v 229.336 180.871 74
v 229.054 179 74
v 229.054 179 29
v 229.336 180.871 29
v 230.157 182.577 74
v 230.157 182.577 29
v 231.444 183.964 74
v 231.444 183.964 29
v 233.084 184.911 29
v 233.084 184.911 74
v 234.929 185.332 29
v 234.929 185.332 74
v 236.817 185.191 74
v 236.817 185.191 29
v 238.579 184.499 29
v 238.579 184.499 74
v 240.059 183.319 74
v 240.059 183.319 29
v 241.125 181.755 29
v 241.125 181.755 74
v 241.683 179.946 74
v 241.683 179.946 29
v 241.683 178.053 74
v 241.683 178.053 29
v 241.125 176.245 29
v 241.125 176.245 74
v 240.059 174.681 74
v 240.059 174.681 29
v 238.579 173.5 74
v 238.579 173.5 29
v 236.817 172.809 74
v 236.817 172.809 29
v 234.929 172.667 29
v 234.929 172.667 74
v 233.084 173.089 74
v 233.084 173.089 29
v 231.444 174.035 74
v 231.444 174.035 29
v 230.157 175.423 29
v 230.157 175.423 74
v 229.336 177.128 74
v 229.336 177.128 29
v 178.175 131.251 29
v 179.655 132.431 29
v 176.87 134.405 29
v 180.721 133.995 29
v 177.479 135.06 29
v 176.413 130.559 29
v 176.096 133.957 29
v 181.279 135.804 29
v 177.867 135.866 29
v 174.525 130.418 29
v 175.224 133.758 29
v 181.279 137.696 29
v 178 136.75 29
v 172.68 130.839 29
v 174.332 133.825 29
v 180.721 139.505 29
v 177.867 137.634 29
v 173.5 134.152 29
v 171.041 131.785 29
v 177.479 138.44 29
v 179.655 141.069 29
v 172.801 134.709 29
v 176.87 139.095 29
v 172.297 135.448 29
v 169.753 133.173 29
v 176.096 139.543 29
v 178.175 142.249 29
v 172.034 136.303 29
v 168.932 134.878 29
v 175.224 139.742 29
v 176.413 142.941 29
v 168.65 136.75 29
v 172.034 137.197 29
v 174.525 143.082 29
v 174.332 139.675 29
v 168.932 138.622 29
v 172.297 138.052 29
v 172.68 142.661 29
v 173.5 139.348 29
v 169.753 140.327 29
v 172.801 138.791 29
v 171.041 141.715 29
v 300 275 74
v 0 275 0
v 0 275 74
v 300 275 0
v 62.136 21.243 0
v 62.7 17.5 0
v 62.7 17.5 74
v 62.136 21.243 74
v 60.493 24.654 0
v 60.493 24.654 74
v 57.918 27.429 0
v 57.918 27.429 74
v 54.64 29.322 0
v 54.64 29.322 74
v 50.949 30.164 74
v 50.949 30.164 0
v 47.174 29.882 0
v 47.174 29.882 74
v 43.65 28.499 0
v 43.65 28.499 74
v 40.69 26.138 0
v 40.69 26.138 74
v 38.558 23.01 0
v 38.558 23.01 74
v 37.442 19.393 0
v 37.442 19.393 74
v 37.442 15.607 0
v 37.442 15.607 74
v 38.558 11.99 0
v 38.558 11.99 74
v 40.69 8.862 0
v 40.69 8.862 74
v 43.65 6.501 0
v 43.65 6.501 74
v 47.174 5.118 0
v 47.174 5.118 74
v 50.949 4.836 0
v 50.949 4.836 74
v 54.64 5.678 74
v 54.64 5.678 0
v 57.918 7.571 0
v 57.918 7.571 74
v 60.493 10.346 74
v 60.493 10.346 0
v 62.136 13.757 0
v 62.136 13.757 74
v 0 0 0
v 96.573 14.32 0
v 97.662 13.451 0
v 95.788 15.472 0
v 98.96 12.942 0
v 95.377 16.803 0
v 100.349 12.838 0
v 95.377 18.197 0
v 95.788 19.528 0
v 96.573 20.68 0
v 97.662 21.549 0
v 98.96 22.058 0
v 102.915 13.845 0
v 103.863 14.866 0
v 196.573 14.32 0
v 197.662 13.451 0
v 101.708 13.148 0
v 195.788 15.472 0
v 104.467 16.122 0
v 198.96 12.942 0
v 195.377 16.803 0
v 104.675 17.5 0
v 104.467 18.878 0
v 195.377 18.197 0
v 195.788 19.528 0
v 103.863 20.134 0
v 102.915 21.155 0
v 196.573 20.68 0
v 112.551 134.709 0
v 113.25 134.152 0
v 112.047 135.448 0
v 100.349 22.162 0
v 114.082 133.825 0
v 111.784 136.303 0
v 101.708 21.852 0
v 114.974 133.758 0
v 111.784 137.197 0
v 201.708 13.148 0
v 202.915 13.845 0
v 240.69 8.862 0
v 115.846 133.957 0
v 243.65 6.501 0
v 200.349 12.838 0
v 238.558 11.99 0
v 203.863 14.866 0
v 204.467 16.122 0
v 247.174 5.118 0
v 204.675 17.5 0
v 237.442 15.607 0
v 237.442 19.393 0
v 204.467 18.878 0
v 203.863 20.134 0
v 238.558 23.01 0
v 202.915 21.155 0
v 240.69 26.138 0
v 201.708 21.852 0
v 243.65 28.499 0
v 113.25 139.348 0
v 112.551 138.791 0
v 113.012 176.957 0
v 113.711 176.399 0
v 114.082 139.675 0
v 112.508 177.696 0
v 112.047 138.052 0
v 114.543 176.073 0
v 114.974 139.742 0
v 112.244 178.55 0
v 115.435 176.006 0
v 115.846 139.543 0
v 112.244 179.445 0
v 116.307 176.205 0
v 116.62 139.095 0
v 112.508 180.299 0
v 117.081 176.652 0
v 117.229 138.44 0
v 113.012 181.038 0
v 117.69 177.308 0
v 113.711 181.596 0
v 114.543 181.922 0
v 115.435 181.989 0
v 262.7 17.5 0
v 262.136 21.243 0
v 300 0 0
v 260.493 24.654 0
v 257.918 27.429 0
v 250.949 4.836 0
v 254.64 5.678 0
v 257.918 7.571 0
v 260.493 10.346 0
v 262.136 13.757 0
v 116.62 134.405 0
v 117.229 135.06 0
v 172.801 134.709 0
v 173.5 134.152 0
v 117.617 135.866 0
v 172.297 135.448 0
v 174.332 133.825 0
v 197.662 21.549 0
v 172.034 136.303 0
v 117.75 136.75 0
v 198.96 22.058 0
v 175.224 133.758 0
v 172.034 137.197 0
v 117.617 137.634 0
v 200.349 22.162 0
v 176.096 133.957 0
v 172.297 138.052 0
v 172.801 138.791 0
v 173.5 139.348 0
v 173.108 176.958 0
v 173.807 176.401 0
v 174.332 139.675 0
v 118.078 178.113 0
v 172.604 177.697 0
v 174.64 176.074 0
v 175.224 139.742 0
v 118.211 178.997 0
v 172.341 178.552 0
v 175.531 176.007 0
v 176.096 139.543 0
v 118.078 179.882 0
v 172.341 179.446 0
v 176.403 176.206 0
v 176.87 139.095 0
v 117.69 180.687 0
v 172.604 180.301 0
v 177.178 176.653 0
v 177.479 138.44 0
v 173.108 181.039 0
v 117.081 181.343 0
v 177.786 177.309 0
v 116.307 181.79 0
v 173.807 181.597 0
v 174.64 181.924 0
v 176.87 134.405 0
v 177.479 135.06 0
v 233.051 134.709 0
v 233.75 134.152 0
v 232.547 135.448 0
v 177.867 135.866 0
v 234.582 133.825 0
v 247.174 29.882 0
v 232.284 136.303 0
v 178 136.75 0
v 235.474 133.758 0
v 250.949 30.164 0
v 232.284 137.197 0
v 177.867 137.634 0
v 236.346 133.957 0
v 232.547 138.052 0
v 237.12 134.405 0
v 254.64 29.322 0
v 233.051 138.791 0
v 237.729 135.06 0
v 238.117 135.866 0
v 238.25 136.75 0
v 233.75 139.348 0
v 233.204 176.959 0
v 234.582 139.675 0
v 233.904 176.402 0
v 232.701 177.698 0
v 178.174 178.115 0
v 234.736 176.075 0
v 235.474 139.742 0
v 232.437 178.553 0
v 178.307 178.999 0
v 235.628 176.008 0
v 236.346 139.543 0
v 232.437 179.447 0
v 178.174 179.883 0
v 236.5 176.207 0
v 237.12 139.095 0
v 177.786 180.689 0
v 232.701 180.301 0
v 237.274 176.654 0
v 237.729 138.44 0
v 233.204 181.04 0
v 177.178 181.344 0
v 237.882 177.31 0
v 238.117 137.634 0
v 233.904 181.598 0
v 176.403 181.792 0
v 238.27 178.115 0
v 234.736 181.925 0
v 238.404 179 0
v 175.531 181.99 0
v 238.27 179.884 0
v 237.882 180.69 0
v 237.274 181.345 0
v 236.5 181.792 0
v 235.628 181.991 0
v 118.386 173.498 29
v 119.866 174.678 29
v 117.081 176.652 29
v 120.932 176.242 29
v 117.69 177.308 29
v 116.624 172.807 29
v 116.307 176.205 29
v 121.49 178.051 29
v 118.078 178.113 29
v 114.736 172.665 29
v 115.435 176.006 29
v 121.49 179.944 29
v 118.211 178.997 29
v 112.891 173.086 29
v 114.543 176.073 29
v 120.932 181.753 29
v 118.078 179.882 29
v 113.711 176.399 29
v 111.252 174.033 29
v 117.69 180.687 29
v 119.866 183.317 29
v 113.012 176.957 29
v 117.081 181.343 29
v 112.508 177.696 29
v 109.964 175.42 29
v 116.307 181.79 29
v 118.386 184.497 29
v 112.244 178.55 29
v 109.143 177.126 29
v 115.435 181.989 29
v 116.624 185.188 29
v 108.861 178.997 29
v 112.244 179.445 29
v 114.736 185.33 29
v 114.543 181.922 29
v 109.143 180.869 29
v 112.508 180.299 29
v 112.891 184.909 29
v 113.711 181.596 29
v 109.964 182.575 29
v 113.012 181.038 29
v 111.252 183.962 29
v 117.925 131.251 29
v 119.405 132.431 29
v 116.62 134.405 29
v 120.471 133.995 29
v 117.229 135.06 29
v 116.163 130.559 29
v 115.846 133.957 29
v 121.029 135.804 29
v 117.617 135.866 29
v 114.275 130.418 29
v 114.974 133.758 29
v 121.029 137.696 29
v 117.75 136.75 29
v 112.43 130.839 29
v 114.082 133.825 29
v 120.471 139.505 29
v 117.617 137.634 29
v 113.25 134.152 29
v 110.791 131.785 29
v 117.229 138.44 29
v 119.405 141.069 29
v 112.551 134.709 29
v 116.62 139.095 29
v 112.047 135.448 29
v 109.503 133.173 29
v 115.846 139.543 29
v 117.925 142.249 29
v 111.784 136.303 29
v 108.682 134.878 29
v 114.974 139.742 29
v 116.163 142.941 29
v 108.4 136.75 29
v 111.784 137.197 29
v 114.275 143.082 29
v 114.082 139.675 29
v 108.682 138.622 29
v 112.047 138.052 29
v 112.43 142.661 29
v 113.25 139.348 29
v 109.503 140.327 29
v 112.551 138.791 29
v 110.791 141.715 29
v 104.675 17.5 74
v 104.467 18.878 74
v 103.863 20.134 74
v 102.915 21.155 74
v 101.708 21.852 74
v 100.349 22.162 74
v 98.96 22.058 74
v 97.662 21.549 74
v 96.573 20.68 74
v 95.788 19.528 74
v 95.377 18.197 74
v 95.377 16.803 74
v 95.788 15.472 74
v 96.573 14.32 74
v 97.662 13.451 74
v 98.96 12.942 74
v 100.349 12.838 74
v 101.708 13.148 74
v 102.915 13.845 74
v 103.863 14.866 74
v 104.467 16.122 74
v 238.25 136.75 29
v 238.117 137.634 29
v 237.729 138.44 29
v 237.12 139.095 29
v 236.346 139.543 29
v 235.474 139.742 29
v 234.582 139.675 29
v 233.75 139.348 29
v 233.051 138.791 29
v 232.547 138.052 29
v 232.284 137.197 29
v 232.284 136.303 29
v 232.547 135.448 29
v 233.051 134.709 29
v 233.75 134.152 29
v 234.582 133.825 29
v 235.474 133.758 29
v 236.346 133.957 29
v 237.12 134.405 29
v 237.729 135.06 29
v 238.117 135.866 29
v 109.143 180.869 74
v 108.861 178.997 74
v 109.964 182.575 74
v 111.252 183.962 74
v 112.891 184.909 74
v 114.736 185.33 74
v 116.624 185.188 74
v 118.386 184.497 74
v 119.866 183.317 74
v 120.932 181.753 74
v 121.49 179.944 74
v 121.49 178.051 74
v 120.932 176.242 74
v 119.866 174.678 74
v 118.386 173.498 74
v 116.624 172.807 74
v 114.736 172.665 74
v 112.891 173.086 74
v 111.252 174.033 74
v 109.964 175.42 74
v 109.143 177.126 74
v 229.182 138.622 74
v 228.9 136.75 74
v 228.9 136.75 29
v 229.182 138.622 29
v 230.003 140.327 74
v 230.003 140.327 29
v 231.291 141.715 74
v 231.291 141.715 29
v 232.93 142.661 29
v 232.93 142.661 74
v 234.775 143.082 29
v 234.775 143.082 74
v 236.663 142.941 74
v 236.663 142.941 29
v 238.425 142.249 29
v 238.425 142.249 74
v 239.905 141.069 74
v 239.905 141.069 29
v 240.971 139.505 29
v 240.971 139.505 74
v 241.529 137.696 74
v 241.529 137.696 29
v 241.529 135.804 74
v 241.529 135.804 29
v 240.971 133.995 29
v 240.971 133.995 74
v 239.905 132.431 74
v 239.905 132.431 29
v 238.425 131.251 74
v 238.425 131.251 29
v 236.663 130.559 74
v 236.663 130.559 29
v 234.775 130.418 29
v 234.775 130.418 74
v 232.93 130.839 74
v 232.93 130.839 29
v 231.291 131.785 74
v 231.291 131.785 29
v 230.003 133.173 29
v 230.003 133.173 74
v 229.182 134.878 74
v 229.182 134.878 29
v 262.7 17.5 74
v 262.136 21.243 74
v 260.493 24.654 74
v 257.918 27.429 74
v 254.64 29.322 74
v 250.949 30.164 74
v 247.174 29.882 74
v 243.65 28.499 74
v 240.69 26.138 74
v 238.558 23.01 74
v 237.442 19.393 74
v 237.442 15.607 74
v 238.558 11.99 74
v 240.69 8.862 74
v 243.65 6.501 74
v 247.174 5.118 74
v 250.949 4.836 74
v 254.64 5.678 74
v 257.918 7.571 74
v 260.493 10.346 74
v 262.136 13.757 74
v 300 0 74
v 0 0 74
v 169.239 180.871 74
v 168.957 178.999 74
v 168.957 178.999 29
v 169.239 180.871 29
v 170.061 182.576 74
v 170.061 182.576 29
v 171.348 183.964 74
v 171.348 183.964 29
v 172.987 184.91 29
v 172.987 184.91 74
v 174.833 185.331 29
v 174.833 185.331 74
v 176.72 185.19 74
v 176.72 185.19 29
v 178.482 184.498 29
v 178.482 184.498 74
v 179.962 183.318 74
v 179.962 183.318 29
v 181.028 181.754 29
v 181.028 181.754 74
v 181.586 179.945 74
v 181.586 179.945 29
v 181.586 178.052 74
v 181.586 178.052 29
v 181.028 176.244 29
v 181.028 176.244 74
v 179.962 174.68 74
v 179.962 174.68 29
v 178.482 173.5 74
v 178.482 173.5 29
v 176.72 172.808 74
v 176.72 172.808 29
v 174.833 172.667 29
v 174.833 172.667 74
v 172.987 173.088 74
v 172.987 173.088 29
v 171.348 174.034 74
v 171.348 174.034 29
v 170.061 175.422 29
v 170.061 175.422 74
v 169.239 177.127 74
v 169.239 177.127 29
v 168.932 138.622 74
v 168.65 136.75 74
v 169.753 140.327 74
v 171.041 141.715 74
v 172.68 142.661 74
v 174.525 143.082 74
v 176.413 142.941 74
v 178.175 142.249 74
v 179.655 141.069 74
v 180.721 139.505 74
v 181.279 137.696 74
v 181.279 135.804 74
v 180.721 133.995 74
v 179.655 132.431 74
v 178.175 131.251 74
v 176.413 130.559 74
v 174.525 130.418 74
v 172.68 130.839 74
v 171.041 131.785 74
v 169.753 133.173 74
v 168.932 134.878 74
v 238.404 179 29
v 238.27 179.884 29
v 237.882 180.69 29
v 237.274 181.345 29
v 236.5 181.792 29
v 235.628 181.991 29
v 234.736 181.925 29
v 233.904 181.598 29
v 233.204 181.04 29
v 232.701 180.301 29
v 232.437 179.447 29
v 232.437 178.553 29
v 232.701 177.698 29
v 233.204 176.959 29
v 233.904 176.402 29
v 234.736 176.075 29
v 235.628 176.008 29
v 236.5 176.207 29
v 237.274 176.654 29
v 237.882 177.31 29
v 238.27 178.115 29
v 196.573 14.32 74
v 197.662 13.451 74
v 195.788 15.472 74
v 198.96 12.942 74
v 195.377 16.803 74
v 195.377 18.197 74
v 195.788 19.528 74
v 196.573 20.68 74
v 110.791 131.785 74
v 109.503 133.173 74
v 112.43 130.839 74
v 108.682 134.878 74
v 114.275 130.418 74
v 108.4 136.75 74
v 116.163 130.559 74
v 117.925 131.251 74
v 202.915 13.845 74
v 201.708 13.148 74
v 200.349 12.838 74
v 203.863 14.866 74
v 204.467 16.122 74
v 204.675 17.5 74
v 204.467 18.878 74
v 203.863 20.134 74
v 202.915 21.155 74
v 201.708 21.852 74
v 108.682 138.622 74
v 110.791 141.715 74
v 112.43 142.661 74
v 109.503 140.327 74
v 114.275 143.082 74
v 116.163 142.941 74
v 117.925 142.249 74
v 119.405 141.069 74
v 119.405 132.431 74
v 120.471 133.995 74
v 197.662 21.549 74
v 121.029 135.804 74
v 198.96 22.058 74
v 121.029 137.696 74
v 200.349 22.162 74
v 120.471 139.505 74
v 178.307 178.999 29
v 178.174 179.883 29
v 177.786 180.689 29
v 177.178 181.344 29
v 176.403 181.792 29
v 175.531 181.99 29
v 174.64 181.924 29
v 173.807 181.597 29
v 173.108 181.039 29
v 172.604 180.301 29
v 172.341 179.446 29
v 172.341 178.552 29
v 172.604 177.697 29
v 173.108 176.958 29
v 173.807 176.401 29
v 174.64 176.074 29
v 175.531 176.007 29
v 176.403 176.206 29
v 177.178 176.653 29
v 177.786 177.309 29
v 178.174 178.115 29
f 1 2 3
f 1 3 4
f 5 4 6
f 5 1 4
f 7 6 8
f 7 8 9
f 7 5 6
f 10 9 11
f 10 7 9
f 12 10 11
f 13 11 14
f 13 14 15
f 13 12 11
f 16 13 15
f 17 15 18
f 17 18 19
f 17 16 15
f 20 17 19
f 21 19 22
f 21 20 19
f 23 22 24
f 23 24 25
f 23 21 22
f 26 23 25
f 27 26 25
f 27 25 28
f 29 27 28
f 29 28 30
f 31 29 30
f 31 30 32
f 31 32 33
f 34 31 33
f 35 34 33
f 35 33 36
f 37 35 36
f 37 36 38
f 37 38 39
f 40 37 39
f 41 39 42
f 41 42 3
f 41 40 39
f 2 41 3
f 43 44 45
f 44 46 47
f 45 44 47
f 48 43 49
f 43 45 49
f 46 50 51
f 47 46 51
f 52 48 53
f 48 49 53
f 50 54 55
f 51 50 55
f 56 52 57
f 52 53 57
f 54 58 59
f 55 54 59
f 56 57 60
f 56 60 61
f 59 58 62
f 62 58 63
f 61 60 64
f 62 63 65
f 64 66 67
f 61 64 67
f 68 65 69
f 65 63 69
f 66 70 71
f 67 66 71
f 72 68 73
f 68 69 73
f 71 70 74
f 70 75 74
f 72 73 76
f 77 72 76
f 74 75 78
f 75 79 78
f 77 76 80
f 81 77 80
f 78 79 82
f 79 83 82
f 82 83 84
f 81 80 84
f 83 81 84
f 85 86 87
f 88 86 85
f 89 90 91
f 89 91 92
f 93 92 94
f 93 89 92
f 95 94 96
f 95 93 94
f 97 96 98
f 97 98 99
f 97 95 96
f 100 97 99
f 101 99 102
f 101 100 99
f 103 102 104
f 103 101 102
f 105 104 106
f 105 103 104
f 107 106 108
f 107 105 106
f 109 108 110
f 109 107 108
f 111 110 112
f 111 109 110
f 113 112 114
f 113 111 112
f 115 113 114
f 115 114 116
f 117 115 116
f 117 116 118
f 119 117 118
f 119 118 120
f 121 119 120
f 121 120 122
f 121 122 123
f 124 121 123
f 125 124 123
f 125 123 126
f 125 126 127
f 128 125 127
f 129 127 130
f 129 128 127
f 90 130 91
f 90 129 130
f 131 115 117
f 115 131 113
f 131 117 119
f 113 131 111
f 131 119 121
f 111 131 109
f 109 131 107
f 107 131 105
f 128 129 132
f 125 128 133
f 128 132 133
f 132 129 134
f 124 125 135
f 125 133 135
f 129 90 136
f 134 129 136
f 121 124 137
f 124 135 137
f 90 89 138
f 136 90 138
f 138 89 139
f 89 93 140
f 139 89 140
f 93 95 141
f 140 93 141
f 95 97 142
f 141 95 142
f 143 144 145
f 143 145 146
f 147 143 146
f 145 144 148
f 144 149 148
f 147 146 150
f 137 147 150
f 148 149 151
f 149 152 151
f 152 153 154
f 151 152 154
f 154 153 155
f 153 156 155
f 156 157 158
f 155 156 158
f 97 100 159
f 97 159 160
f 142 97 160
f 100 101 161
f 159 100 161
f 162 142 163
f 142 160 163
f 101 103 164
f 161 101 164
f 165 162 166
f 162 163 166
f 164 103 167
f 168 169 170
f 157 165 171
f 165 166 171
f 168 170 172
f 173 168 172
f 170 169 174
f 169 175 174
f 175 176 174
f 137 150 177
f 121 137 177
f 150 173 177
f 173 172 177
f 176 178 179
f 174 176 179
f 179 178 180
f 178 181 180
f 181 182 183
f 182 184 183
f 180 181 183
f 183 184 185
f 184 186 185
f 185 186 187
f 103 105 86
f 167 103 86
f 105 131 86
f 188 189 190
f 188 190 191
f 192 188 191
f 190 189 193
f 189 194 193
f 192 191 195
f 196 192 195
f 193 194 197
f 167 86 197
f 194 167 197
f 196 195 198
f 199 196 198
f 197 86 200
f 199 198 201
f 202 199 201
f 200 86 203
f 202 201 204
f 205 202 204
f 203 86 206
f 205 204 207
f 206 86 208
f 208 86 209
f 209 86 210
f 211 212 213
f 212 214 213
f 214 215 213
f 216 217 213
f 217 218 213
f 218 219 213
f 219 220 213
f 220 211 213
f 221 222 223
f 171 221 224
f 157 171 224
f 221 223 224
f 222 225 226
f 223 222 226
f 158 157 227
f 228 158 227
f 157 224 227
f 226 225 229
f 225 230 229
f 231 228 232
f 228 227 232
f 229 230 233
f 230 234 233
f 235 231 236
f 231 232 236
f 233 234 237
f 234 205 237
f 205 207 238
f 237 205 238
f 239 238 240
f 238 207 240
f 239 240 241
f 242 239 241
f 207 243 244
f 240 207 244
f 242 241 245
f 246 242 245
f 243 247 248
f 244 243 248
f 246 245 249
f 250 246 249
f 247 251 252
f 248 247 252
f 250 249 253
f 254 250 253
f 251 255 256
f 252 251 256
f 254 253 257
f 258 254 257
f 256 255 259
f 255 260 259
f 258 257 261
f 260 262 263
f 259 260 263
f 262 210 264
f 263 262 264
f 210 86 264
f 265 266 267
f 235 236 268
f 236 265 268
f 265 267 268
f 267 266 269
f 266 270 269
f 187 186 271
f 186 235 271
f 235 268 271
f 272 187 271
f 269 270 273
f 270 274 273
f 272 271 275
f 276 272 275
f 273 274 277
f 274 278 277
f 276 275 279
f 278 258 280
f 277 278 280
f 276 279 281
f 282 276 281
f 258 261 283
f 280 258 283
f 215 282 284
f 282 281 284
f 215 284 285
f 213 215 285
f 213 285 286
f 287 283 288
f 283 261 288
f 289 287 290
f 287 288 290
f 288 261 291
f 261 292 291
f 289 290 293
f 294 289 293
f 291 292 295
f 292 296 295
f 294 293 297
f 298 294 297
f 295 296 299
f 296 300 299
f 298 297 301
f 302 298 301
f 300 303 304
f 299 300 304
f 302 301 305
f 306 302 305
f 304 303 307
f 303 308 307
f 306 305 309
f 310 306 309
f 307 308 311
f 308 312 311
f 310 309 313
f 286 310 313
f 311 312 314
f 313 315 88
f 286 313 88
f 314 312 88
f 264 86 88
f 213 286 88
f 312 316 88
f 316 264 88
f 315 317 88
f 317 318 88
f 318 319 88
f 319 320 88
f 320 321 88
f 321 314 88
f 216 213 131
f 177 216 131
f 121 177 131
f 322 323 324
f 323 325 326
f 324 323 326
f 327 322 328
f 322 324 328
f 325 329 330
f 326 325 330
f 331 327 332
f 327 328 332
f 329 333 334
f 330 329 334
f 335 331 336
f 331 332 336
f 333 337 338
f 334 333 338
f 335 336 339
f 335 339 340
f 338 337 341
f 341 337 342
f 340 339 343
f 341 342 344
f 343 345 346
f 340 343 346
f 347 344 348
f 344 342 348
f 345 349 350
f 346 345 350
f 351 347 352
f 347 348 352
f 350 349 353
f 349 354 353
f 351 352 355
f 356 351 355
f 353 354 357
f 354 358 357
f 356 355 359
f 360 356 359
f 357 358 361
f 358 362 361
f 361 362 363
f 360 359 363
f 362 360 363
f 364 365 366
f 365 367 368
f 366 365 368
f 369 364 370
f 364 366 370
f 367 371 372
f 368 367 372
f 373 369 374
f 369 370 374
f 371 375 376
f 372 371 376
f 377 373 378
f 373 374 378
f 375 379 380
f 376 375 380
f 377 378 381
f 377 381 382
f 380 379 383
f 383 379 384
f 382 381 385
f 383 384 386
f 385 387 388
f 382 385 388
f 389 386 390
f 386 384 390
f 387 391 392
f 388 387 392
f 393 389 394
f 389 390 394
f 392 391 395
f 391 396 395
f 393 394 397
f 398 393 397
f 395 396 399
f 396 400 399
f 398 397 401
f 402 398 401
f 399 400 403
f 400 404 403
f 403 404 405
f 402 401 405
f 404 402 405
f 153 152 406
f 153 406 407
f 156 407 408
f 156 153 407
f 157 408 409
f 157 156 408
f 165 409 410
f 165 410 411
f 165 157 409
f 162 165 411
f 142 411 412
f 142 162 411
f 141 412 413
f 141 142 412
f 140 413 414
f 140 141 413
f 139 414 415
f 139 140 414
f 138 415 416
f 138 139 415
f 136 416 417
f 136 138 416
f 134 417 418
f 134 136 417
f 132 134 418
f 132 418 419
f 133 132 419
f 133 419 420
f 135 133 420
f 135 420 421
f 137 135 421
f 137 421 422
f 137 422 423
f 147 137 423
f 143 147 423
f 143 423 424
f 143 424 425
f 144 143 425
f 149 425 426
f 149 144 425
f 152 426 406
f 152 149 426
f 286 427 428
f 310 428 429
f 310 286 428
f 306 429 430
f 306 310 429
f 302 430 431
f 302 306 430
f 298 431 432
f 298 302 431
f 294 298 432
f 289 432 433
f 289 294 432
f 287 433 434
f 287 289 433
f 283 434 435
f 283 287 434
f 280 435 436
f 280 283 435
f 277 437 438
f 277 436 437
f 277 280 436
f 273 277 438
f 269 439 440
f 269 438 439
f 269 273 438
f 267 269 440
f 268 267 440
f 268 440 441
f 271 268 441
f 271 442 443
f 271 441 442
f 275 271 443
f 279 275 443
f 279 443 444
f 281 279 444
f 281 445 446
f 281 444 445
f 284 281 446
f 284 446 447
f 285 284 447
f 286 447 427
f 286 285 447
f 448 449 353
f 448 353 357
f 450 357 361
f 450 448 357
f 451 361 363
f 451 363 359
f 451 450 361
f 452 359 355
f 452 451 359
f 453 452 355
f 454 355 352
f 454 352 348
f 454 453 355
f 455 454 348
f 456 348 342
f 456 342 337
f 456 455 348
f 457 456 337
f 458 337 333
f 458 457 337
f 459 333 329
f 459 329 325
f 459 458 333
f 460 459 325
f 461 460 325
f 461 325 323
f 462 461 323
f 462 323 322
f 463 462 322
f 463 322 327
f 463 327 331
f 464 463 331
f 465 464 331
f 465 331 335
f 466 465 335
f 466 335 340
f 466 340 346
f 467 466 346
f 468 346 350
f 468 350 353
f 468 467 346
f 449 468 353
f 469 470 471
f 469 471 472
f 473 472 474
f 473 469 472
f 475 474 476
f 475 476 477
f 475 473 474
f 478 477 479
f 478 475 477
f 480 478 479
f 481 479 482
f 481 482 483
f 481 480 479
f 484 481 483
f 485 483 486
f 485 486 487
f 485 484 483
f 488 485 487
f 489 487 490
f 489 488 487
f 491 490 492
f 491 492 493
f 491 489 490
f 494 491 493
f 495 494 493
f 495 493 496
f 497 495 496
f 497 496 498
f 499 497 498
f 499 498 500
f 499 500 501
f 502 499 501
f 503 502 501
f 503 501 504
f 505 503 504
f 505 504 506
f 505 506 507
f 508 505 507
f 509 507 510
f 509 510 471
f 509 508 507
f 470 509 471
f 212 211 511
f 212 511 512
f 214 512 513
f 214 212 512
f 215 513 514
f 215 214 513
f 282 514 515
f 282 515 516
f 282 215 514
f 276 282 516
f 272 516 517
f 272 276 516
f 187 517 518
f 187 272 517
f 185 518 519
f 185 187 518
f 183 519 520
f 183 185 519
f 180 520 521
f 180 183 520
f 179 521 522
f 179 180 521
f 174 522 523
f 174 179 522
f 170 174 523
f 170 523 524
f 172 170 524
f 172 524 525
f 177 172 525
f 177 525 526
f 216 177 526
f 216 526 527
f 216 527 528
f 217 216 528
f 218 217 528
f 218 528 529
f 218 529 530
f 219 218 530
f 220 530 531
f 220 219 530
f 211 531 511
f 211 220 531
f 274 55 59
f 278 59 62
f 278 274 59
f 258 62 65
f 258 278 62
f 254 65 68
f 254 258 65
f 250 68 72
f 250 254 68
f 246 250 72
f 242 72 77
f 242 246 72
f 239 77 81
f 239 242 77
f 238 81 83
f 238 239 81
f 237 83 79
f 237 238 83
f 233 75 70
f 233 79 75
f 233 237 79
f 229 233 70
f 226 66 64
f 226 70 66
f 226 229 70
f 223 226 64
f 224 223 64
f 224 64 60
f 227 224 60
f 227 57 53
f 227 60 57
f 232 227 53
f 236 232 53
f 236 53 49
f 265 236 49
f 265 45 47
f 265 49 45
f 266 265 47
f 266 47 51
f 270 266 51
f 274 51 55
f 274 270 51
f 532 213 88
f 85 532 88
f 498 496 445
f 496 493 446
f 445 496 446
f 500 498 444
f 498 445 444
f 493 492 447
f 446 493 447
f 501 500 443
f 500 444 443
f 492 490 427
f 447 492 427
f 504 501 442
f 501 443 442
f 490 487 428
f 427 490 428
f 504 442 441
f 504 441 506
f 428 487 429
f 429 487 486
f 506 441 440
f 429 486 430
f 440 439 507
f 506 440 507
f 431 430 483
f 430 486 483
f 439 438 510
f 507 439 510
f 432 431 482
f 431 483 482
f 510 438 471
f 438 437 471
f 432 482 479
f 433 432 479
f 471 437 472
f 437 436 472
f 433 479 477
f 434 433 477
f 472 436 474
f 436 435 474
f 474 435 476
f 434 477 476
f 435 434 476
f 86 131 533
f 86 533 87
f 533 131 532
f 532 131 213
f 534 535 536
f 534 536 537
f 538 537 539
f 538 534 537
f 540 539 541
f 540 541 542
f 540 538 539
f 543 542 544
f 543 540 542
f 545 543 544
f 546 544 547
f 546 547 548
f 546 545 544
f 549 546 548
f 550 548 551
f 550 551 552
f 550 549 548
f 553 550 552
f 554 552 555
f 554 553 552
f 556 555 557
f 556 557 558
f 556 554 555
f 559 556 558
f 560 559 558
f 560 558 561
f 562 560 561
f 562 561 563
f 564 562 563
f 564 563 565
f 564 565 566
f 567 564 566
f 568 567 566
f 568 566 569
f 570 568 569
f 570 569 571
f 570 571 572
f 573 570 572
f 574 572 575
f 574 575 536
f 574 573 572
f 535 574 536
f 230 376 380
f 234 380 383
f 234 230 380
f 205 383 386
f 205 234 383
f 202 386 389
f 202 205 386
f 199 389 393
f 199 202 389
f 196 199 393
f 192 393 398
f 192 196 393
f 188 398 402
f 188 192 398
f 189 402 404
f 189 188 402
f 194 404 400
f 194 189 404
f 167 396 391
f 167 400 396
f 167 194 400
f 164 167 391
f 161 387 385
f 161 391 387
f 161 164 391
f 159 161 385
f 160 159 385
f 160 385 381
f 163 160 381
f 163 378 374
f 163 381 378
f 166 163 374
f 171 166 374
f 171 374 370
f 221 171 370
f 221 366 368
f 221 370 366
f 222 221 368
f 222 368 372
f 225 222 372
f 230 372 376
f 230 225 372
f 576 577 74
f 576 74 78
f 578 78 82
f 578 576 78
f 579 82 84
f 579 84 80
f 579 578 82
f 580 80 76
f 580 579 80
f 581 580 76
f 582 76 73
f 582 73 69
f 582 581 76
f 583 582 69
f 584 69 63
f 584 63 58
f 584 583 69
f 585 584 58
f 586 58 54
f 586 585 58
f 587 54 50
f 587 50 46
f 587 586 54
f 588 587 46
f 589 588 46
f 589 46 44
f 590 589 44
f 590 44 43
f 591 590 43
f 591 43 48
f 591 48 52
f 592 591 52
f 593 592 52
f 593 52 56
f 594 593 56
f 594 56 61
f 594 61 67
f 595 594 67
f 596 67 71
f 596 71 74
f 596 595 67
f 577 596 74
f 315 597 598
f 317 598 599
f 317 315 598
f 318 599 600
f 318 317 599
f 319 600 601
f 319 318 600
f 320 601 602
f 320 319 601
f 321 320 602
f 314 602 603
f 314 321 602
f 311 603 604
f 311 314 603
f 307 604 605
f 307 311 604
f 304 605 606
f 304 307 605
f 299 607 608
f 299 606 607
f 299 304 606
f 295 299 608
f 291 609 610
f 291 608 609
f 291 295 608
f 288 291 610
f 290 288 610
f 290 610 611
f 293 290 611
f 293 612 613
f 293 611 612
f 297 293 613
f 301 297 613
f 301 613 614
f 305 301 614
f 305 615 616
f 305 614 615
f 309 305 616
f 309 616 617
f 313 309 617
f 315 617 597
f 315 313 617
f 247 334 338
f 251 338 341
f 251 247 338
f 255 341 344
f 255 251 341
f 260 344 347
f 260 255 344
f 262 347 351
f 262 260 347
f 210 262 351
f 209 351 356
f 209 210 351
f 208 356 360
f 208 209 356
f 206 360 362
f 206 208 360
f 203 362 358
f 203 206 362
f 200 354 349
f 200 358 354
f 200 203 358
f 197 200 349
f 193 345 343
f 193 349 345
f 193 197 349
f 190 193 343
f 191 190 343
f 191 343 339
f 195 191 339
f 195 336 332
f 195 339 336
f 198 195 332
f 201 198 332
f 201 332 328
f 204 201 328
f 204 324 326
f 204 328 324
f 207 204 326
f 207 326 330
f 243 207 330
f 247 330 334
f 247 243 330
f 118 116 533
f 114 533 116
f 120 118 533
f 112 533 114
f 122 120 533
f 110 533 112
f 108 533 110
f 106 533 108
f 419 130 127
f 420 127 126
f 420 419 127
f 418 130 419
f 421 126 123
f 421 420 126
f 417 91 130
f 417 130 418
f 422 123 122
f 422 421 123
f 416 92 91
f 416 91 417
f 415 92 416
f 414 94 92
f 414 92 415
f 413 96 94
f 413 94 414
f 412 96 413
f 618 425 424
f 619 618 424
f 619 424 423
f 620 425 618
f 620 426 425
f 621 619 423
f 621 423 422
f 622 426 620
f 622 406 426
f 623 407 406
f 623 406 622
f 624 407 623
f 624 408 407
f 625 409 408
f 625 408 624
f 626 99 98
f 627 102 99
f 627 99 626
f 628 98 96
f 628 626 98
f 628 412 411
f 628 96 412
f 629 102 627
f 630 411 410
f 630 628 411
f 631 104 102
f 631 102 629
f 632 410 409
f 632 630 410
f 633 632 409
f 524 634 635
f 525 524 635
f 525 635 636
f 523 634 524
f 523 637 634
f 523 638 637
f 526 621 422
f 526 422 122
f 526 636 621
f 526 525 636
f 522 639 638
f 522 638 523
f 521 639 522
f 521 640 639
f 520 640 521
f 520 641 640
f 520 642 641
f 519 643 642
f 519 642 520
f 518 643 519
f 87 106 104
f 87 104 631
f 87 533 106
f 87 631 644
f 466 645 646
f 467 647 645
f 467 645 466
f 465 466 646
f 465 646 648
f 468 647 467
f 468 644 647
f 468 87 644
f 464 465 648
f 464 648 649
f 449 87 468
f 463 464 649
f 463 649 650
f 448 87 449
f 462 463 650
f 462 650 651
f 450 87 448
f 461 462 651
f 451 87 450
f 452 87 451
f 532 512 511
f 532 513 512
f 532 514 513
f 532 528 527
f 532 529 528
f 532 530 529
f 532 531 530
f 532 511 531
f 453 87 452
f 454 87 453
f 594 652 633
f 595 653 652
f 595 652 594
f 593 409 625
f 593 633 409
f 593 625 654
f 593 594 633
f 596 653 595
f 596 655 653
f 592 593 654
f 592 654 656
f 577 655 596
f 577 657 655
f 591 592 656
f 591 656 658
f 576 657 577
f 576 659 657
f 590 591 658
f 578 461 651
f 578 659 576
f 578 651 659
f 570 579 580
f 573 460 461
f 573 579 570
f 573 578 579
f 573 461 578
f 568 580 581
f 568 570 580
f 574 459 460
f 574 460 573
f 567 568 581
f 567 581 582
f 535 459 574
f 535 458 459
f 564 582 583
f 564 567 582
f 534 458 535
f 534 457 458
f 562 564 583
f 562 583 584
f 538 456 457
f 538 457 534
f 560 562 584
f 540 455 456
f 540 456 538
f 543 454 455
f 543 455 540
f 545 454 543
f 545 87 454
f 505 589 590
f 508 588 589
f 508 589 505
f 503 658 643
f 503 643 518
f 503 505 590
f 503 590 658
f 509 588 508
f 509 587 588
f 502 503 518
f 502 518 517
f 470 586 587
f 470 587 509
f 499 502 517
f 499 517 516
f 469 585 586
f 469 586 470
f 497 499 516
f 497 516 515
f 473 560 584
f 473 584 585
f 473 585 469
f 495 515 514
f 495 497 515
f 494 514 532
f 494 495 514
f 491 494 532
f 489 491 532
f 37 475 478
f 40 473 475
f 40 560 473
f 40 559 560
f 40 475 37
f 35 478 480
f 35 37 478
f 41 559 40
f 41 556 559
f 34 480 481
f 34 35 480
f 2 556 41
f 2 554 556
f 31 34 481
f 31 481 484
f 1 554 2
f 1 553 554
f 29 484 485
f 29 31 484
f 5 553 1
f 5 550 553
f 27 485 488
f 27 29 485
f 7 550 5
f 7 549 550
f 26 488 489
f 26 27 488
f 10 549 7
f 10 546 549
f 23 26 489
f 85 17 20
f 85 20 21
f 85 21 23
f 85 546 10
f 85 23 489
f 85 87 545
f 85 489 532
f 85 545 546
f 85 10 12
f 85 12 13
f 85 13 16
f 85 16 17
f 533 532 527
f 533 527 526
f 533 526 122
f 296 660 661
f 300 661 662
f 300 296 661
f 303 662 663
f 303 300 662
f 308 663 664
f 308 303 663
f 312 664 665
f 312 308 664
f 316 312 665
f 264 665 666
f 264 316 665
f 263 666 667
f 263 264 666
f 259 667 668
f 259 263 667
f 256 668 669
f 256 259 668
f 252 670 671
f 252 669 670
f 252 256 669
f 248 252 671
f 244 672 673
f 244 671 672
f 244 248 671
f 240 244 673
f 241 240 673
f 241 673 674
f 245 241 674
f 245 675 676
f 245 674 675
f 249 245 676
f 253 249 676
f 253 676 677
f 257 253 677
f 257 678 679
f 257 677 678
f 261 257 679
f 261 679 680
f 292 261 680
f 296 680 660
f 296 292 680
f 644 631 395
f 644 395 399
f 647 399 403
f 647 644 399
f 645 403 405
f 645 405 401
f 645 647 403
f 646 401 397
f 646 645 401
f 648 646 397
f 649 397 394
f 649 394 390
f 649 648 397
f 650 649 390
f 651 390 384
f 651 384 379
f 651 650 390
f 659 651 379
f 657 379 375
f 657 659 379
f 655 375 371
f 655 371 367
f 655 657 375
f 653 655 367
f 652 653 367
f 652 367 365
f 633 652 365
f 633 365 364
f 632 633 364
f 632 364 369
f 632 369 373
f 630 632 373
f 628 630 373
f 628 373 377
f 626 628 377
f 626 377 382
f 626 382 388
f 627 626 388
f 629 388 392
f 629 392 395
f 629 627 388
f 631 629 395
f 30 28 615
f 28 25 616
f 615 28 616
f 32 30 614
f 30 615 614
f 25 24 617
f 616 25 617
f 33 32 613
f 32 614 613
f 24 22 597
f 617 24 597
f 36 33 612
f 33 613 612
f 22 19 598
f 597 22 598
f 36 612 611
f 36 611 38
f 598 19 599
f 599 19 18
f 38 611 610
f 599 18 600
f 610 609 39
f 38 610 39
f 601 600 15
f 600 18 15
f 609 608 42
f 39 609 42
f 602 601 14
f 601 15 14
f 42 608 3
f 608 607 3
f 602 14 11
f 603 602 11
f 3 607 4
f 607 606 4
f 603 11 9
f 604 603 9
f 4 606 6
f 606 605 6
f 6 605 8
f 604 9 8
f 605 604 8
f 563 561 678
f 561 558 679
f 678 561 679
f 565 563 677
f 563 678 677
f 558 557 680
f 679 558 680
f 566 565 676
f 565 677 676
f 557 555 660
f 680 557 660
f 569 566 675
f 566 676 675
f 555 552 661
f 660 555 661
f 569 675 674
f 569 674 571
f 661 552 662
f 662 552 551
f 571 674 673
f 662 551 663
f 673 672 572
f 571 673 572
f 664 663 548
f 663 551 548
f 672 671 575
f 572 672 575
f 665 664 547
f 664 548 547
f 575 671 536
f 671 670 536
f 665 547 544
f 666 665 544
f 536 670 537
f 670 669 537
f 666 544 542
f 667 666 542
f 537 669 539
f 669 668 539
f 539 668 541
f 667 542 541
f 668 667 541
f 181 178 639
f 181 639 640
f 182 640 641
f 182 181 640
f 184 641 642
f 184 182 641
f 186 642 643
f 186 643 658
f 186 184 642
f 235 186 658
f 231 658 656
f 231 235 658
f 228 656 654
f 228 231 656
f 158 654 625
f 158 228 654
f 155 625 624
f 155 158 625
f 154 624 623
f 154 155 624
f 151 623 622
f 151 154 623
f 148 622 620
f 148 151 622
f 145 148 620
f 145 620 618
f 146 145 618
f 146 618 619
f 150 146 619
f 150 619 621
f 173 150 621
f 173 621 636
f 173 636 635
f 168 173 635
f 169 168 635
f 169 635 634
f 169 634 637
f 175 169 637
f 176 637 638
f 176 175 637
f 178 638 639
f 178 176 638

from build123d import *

# Parameters (mm, degrees)
SKETCH1_W           = 300
SKETCH1_H           = 275
SKETCH1_R           = 12.7
SKETCH1_R_2         = 4.675
SKETCH1_R_3         = 3
BOSS_EXTRUDE1_DEPTH = 74
SKETCH2_R           = 6.35
CUT_EXTRUDE1_DEPTH  = 45


with BuildPart() as part:
    # Sketch1 → Boss-Extrude1 (new body)
    with BuildSketch(Plane.XY):
        with Locations((150, 137.5)):
            Rectangle(SKETCH1_W, SKETCH1_H)
        with Locations((250, 17.5)):
            Circle(SKETCH1_R, mode=Mode.SUBTRACT)
        with Locations((200, 17.5)):
            Circle(SKETCH1_R_2, mode=Mode.SUBTRACT)
        with Locations((100, 17.5)):
            Circle(SKETCH1_R_2, mode=Mode.SUBTRACT)
        with Locations((50, 17.5)):
            Circle(SKETCH1_R, mode=Mode.SUBTRACT)
        with Locations((235.25, 136.75)):
            Circle(SKETCH1_R_3, mode=Mode.SUBTRACT)
        with Locations((114.75, 136.75)):
            Circle(SKETCH1_R_3, mode=Mode.SUBTRACT)
        with Locations((175, 136.75)):
            Circle(SKETCH1_R_3, mode=Mode.SUBTRACT)
        with Locations((115.210881667, 178.997486175)):
            Circle(SKETCH1_R_3, mode=Mode.SUBTRACT)
        with Locations((175.307264601, 178.998882689)):
            Circle(SKETCH1_R_3, mode=Mode.SUBTRACT)
        with Locations((235.403635348, 178.999720664)):
            Circle(SKETCH1_R_3, mode=Mode.SUBTRACT)
    extrude(amount=BOSS_EXTRUDE1_DEPTH)

    # Sketch2 → Cut-Extrude1 (cut)
    with BuildSketch(Plane(origin=(0, 0, 74), x_dir=(-1, 0, 0), z_dir=(0, 0, -1))):
        with Locations((-175, 136.75)):
            Circle(SKETCH2_R)
        with Locations((-235.25, 136.75)):
            Circle(SKETCH2_R)
        with Locations((-235.403635348, 178.999720664)):
            Circle(SKETCH2_R)
        with Locations((-175.307264601, 178.998882689)):
            Circle(SKETCH2_R)
        with Locations((-115.210881667, 178.997486175)):
            Circle(SKETCH2_R)
        with Locations((-114.75, 136.75)):
            Circle(SKETCH2_R)
    extrude(amount=CUT_EXTRUDE1_DEPTH, mode=Mode.SUBTRACT)


solid = part.part
